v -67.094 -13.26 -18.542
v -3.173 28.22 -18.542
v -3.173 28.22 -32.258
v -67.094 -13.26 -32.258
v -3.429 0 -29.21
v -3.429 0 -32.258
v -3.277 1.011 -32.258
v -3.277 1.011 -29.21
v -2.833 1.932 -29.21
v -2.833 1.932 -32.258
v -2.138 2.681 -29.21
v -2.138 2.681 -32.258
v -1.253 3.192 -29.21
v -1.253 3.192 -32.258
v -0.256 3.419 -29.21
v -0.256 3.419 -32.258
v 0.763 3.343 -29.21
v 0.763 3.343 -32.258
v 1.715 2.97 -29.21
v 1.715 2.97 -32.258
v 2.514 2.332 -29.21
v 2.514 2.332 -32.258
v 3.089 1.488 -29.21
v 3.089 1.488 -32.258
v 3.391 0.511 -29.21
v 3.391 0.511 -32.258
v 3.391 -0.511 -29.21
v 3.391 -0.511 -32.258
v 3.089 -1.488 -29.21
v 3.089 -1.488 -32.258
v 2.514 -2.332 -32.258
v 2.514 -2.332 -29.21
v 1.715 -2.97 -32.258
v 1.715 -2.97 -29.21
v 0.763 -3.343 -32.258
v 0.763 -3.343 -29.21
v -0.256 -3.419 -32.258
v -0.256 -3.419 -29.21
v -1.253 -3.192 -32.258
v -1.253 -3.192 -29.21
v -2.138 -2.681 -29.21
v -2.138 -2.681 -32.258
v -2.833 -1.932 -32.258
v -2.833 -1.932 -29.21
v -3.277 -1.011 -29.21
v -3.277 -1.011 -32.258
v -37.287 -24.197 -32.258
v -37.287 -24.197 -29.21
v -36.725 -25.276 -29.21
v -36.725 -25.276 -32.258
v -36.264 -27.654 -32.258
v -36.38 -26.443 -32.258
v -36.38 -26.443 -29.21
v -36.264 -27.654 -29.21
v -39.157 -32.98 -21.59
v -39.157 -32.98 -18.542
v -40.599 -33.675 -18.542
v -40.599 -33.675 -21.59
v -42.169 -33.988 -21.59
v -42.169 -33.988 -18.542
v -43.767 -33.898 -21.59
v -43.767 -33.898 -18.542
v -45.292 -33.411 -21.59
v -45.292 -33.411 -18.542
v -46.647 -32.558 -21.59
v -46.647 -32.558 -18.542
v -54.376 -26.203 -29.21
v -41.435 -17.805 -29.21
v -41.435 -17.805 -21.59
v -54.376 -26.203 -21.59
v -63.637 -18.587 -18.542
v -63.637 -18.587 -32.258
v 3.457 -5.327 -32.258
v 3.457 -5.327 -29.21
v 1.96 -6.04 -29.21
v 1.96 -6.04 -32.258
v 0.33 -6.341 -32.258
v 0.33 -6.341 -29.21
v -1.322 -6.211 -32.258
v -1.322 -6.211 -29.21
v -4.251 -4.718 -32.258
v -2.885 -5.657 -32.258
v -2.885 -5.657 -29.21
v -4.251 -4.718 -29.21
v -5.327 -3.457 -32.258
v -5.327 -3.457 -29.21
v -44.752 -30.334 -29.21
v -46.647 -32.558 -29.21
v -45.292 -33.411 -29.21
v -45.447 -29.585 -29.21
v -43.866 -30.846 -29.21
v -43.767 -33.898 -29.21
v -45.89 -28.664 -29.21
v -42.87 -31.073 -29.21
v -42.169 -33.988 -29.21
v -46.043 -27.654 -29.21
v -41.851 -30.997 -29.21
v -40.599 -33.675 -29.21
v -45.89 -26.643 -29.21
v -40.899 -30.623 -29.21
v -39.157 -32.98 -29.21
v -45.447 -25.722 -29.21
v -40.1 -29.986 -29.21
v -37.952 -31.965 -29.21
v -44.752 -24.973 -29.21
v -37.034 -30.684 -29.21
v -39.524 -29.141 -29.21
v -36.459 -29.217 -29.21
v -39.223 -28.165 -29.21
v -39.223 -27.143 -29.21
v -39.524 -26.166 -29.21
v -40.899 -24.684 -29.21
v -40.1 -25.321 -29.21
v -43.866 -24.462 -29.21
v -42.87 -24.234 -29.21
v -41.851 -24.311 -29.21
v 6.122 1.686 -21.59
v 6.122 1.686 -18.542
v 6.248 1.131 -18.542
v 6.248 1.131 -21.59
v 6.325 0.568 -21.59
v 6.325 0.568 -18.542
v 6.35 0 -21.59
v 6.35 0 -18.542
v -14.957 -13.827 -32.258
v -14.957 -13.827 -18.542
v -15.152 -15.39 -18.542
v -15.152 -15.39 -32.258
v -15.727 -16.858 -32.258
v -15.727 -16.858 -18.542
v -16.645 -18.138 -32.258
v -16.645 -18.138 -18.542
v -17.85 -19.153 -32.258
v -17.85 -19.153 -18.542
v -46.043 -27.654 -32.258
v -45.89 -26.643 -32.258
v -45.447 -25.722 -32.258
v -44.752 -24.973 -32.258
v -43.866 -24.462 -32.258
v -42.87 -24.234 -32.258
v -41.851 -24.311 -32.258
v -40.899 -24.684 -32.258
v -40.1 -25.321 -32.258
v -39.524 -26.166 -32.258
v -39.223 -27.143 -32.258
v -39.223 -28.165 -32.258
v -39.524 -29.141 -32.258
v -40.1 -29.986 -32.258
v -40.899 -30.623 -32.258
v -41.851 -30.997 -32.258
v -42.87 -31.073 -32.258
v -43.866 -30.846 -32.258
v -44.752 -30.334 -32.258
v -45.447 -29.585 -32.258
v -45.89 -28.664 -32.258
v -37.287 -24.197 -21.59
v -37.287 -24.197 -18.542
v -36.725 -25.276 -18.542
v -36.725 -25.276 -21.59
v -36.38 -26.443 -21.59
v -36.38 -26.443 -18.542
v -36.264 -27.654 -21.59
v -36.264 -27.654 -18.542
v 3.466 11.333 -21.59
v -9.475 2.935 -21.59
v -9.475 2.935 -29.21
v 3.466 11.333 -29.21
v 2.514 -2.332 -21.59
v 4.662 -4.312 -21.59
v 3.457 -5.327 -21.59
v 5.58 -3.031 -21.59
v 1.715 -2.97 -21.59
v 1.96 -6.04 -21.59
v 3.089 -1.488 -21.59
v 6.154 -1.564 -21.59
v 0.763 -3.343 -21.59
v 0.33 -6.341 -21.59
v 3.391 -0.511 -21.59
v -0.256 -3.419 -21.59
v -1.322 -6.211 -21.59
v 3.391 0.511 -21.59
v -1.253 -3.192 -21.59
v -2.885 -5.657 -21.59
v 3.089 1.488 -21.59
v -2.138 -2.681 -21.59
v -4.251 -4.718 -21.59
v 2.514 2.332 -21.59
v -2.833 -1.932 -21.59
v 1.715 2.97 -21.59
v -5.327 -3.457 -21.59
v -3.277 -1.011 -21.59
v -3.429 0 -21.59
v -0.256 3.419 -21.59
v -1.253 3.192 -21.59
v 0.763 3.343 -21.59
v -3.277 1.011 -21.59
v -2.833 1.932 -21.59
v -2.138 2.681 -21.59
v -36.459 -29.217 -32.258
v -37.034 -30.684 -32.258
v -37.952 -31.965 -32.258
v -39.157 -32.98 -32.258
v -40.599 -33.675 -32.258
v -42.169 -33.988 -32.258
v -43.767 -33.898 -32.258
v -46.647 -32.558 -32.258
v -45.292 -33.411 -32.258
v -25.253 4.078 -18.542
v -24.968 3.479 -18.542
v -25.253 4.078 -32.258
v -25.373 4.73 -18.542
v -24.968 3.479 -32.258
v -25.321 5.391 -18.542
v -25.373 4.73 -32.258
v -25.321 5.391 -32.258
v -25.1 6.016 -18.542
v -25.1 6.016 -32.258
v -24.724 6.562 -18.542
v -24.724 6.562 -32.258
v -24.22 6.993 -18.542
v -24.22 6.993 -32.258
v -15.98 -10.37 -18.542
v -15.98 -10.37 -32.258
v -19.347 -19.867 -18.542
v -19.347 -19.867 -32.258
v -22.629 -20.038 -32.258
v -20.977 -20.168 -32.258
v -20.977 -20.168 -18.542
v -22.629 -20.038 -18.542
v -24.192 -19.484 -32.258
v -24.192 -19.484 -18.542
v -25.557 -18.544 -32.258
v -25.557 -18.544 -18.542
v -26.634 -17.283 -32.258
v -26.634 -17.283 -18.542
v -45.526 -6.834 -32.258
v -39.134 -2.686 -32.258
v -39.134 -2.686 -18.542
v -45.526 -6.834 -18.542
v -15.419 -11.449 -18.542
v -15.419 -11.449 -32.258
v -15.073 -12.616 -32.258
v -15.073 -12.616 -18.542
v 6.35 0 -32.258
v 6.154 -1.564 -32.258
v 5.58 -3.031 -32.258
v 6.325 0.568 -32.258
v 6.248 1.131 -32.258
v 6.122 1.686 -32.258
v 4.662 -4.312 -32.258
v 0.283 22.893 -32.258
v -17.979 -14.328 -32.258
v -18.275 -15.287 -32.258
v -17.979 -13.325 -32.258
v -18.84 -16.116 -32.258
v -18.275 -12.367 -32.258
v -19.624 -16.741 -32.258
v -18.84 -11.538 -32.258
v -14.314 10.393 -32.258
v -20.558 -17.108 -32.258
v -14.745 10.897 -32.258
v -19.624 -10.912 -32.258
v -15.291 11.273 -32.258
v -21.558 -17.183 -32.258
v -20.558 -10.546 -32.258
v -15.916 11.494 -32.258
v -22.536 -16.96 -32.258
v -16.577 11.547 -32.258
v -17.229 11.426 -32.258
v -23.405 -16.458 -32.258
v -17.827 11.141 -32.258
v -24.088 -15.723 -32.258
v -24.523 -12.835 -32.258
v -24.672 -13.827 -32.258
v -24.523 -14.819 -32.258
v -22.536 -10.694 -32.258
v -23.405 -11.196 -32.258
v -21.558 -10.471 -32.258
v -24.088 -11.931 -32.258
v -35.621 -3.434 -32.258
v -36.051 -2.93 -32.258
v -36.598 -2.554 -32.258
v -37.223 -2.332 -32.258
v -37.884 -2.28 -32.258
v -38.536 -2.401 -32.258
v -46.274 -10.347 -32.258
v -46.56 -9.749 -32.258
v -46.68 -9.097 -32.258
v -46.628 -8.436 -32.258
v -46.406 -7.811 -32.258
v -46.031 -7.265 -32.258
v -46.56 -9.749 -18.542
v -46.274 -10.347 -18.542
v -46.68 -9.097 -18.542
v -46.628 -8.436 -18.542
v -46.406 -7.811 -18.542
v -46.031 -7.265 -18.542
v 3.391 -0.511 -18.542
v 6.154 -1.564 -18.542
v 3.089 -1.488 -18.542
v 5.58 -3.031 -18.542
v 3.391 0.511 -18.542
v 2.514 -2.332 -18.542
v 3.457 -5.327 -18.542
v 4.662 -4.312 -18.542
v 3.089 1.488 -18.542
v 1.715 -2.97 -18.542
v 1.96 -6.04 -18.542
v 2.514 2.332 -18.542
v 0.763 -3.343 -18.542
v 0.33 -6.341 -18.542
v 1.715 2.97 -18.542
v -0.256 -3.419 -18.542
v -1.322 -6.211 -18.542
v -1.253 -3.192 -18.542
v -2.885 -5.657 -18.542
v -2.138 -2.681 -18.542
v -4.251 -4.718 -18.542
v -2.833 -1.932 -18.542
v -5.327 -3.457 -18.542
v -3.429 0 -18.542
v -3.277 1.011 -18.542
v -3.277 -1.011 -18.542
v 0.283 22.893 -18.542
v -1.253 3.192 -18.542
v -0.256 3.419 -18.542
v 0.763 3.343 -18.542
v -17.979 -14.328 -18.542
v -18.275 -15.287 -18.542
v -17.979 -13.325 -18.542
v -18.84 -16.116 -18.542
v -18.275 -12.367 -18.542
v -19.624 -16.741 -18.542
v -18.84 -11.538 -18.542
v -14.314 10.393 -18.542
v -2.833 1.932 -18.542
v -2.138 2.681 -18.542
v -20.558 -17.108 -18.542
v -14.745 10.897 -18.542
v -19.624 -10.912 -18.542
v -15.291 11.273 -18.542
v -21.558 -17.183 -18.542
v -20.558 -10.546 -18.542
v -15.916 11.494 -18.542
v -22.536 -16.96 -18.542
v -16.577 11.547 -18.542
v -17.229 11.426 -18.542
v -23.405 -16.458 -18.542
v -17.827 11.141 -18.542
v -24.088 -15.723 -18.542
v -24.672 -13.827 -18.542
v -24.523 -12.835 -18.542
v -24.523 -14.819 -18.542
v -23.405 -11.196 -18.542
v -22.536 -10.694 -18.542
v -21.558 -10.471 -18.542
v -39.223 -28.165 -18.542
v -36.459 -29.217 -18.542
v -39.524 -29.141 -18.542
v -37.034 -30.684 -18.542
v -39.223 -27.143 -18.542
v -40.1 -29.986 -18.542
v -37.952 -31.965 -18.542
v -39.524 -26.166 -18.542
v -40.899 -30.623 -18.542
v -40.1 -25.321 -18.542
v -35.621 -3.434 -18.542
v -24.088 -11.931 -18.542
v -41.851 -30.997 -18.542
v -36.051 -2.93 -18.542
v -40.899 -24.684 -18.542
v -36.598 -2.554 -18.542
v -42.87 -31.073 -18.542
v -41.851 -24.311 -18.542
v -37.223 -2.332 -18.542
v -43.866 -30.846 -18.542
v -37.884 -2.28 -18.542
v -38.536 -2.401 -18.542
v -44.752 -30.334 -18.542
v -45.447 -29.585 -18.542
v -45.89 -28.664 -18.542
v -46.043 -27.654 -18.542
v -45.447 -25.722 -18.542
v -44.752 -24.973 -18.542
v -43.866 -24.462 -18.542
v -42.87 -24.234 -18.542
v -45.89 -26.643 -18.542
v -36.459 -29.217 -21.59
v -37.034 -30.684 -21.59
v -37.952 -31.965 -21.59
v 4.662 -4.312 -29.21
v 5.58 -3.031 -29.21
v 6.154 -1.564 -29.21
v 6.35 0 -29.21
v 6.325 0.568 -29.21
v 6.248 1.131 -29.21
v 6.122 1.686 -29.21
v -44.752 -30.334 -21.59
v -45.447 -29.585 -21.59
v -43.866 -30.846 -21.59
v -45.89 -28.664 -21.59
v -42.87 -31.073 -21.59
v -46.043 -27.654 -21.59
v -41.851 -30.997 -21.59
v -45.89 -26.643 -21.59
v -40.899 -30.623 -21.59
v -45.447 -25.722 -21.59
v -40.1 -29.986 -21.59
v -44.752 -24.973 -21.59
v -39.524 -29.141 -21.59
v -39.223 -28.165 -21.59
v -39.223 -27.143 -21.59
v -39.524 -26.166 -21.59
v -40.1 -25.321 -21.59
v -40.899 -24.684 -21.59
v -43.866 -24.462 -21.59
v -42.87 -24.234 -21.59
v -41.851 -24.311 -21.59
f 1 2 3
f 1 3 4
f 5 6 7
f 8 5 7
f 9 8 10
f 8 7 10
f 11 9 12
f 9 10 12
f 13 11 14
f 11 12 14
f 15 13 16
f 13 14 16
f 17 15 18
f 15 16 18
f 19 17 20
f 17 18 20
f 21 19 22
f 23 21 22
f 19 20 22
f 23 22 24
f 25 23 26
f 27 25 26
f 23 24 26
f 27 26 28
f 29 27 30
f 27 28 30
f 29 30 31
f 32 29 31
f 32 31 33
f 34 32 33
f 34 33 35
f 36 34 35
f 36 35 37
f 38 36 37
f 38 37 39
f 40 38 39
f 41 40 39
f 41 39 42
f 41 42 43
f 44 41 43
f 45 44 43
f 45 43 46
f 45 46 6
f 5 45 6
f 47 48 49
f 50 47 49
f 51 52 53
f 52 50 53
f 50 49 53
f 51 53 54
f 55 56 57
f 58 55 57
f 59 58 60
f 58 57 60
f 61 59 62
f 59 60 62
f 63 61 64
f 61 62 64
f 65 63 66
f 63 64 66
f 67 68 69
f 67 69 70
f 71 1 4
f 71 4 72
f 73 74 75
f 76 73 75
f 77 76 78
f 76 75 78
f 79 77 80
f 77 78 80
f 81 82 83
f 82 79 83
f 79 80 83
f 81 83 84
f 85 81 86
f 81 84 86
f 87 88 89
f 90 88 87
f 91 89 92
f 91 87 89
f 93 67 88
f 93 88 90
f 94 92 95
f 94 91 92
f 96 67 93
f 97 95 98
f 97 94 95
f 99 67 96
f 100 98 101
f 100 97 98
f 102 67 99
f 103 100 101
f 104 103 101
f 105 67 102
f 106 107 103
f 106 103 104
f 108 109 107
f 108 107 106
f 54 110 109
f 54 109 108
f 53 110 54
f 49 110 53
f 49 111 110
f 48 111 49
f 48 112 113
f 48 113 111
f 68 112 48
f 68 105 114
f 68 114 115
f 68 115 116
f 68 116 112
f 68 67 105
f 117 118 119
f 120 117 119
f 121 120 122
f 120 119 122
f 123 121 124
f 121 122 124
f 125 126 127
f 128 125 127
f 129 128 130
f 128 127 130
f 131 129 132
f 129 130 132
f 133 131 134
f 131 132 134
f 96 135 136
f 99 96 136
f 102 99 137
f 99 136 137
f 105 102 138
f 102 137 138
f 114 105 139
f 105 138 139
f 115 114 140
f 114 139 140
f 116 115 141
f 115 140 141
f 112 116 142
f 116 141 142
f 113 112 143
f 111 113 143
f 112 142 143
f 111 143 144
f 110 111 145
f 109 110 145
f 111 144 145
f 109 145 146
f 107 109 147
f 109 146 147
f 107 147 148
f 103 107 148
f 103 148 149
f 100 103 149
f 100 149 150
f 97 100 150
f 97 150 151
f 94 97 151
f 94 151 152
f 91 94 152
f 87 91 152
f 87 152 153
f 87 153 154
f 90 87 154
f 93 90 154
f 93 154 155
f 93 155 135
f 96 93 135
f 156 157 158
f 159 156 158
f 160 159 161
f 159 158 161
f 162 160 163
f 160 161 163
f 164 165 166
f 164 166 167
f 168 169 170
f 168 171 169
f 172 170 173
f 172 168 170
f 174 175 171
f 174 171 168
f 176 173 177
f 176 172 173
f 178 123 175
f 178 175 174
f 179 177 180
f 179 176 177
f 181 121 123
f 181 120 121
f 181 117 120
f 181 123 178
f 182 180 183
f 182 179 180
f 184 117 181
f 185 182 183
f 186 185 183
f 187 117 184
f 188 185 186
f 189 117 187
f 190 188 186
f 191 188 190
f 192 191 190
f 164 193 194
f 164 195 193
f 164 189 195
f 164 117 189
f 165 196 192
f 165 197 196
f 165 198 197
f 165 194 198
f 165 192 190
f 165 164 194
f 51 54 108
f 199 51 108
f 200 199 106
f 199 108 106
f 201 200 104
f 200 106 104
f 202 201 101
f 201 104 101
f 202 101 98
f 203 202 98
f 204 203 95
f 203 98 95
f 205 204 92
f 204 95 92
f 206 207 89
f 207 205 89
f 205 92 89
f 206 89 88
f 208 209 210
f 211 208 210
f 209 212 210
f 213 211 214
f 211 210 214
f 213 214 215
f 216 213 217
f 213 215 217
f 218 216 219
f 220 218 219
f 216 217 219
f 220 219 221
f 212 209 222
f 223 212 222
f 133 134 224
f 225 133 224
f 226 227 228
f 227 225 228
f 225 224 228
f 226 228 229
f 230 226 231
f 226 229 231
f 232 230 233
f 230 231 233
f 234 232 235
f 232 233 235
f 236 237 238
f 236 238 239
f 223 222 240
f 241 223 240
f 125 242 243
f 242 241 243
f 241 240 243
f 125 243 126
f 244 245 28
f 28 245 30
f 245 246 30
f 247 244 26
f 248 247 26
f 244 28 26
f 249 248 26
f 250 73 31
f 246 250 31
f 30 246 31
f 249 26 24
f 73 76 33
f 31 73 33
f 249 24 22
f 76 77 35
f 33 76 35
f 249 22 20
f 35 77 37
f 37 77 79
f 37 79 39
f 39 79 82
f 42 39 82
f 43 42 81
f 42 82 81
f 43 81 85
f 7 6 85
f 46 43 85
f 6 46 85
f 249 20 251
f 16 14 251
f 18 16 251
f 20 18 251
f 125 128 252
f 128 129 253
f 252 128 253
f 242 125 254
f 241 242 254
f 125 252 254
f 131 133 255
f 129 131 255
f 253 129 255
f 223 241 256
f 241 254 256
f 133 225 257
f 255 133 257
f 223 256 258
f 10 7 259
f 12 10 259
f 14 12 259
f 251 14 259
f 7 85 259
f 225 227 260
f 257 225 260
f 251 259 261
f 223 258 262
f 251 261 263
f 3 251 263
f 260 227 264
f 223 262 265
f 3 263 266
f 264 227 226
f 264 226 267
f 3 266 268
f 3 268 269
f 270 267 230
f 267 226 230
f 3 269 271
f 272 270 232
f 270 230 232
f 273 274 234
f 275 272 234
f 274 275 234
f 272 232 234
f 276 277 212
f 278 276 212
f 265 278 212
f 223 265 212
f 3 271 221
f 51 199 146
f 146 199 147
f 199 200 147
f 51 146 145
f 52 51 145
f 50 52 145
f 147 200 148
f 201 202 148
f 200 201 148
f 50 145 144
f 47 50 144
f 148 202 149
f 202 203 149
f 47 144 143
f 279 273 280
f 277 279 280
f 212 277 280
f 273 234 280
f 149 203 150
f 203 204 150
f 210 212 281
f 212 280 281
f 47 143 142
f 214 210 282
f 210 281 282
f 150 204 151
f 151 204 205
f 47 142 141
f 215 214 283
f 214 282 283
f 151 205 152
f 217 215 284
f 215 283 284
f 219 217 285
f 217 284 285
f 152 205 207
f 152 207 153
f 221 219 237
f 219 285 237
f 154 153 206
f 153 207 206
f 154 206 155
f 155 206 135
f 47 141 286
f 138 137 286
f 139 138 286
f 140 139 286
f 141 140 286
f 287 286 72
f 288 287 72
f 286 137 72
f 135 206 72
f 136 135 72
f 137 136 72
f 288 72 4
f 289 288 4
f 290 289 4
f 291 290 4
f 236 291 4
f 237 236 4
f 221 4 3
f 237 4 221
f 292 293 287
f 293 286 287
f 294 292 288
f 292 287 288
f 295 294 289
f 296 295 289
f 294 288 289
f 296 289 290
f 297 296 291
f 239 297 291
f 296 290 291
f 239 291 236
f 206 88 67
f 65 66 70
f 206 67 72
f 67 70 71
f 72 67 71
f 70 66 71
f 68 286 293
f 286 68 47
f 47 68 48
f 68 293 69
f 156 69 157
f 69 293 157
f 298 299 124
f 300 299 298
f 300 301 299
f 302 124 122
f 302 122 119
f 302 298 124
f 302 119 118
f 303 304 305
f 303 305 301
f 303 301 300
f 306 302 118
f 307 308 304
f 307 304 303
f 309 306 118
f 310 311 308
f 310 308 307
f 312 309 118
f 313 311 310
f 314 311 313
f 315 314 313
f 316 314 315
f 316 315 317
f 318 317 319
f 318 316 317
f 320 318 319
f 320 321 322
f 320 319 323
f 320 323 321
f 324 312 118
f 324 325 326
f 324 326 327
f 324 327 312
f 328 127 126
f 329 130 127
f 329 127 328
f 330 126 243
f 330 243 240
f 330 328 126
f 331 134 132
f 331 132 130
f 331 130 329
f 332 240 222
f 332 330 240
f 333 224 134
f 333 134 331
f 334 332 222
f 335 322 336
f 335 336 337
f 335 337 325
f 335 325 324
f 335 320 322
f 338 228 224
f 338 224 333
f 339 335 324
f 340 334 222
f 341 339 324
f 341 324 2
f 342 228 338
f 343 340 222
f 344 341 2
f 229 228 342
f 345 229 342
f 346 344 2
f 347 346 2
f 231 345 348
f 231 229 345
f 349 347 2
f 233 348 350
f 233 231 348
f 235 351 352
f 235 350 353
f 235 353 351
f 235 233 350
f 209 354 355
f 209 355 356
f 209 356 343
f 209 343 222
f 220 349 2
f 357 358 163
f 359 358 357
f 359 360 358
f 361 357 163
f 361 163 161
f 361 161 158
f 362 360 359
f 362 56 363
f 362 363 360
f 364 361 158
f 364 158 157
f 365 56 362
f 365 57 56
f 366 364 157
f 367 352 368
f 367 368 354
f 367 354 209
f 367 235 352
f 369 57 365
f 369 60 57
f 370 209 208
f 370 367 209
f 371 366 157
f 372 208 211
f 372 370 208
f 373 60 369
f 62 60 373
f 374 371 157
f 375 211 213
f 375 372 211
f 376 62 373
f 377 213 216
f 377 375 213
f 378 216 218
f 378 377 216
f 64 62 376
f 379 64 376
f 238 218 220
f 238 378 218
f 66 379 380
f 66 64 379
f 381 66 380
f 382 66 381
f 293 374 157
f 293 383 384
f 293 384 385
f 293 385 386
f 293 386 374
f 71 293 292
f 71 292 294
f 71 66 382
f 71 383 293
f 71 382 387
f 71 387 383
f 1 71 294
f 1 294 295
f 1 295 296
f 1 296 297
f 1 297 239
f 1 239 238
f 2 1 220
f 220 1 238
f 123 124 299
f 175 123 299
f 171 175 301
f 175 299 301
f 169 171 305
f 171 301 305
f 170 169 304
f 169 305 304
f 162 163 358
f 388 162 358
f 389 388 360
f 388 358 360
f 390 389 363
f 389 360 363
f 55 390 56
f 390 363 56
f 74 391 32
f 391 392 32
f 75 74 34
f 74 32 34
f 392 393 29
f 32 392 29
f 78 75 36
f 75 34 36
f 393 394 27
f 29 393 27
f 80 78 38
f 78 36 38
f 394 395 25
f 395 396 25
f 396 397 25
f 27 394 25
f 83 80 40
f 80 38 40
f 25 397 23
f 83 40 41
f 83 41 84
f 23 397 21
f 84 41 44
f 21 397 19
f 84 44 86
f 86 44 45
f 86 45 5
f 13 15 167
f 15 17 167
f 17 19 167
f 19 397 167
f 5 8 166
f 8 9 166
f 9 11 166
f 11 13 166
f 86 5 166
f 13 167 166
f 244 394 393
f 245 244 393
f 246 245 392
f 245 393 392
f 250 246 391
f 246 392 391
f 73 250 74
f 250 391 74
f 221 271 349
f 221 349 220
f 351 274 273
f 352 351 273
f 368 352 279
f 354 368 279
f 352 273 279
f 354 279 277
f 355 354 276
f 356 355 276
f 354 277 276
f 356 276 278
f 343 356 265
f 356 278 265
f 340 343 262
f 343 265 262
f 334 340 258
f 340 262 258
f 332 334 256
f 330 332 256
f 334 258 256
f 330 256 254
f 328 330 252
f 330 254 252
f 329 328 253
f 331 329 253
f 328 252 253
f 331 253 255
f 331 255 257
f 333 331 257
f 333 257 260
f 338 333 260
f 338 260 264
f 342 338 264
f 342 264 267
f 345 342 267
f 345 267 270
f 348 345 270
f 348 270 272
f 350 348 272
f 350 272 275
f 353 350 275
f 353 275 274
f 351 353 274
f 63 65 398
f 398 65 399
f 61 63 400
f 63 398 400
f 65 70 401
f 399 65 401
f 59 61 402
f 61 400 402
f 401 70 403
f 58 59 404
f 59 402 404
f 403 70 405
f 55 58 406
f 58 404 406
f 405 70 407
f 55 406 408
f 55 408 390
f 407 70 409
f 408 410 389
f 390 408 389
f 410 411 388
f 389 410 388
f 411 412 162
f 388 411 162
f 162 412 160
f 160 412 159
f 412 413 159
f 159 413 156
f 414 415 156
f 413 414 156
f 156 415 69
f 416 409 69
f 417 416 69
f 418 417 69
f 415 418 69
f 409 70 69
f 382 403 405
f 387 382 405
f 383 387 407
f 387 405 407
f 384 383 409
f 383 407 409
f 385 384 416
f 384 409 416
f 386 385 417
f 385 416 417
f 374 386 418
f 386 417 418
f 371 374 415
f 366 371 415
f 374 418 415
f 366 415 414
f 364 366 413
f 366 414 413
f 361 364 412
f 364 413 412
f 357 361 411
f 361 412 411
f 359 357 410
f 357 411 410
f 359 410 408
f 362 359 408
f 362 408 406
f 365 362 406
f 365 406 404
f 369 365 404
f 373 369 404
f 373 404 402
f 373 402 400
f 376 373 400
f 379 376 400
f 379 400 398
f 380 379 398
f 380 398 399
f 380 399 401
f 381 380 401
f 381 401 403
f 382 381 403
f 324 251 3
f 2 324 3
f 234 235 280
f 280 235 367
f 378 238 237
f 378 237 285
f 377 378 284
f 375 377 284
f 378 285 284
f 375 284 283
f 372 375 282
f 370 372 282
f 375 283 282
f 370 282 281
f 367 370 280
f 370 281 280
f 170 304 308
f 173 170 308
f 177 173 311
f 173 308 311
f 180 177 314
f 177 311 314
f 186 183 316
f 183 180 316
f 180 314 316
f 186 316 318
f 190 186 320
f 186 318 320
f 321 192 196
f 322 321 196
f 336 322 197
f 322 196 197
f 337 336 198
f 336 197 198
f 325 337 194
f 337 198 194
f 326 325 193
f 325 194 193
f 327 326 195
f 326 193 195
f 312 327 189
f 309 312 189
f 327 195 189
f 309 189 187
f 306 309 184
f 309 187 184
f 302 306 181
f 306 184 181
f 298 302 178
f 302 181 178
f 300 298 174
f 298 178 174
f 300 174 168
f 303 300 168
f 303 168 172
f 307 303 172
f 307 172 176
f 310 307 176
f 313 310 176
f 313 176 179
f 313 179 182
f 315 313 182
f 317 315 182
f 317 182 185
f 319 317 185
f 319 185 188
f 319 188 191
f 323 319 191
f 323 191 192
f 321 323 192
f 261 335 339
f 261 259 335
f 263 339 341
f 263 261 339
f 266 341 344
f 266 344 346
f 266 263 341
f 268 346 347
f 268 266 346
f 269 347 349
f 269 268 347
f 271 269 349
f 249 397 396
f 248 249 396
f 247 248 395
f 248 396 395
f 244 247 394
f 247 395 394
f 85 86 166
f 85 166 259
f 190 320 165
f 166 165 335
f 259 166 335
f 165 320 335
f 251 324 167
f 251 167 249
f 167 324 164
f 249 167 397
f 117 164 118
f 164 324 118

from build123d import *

# Parameters (mm, degrees)
SKETCH1_R               = 3.175
SKETCH1_R_2             = 3.1115
BOSS_EXTRUDE1_DEPTH     = 50.8
CUT_EXTRUDE1_DEPTH      = 3.81
CUT_EXTRUDE6_DEPTH      = 94.132822302
CUT_EXTRUDE7_DEPTH      = 81.280992342
CUT_EXTRUDE7_DEPTH_BACK = 81.280992342
SKETCH8_W               = 18.542
SKETCH8_H               = 31.75
SKETCH9_R               = 3.429
SKETCH9_R_2             = 3.3655
CUT_EXTRUDE8_DEPTH      = 77.458810064
FILLET1_R               = 2.54


with BuildPart() as part:
    # Sketch1 → Boss-Extrude1 (new body)
    with BuildSketch(Plane.XY):
        Polygon((-3.17337999, 28.220199493), (-67.093802786, -13.260151874), (-49.810323049, -39.893661373), (14.110099747, 1.586689995), align=None)
        Circle(SKETCH1_R, mode=Mode.SUBTRACT)
        with Locations((-42.613615197, -27.653567579)):
            Circle(SKETCH1_R, mode=Mode.SUBTRACT)
        with Locations((-21.306807599, -13.826783789)):
            Circle(SKETCH1_R_2, mode=Mode.SUBTRACT)
    extrude(amount=-BOSS_EXTRUDE1_DEPTH)

    # Sketch2 → Cut-Extrude1 (cut, symmetric)
    with BuildSketch(Plane.XY.offset(-25.4)):
        Polygon((-36.108246535, -14.348133404), (-57.415054133, -28.174917194), (-49.810323049, -39.893661373), (-39.15691925, -32.980269478), (-28.503515451, -26.066877584), align=None)
        Polygon((-14.801438936, -0.521349615), (6.505368663, 13.305434174), (14.110099747, 1.586689995), (3.456695947, -5.3267019), (-7.196707852, -12.240093794), align=None)
    extrude(amount=CUT_EXTRUDE1_DEPTH, both=True, mode=Mode.SUBTRACT)

    # Sketch7 → Cut-Extrude6 (cut, through all)
    with BuildSketch(Plane.XY):
        with BuildLine():
            Line((-47.65700114, -8.216765932), (-37.286913298, -24.196871631))
            ThreePointArc((-37.286913298, -24.196871631), (-36.524811659, -25.851077227), (-36.263615197, -27.653567579))
            ThreePointArc((-36.263615197, -27.653567579), (-37.033627746, -30.684448646), (-39.156919149, -32.980269413))
            Line((-39.156919149, -32.980269413), (-17.850111759, -19.153485759))
            ThreePointArc((-17.850111759, -19.153485759), (-22.629101551, -20.037583955), (-26.633509498, -17.283479737))
            Line((-26.633509498, -17.283479737), (-37.00359734, -1.303374038))
            Line((-37.00359734, -1.303374038), (-47.65700114, -8.216765932))
        make_face()
        with BuildLine():
            ThreePointArc((-14.956807599, -13.826783789), (-15.726820207, -16.857664966), (-17.850111759, -19.153485759))
            Line((-17.850111759, -19.153485759), (3.456695863, -5.326701954))
            ThreePointArc((3.456695863, -5.326701954), (-1.322293939, -6.210800169), (-5.3267019, -3.456695947))
            Line((-5.3267019, -3.456695947), (-15.696789742, 12.523409752))
            Line((-15.696789742, 12.523409752), (-26.350193541, 5.610017857))
            Line((-26.350193541, 5.610017857), (-15.980105699, -10.370087842))
            ThreePointArc((-15.980105699, -10.370087842), (-15.21800406, -12.024293437), (-14.956807599, -13.826783789))
        make_face()
        with BuildLine():
            ThreePointArc((6.35, 0), (5.579987398, -3.030881165), (3.456695863, -5.326701954))
            Line((3.456695863, -5.326701954), (14.110099747, 1.586689995))
            Line((14.110099747, 1.586689995), (0.283315957, 22.893497594))
            Line((0.283315957, 22.893497594), (6.122209073, 1.685543256))
            ThreePointArc((6.122209073, 1.685543256), (6.292794594, 0.850432945), (6.35, 0))
        make_face()
        with BuildLine():
            ThreePointArc((-39.156919149, -32.980269413), (-42.970845505, -33.993511309), (-46.646808241, -32.558244313))
            Line((-46.646808241, -32.558244313), (-63.637106839, -18.586853774))
            Line((-63.637106839, -18.586853774), (-49.810323049, -39.893661373))
            Line((-49.810323049, -39.893661373), (-39.156919149, -32.980269413))
        make_face()
    extrude(amount=-CUT_EXTRUDE6_DEPTH, mode=Mode.SUBTRACT)

    # Sketch8 → Cut-Extrude7 (cut, two sides: drawn at the far end of the back side and taken through both)
    with BuildSketch(Plane(origin=(-21.306807599, -13.826783789, 0), x_dir=(0, 0, -1), z_dir=(0.838850692859666, 0.5443615665059929, 0)).offset(-CUT_EXTRUDE7_DEPTH_BACK)):
        with Locations((9.271, 9.525)):
            Rectangle(SKETCH8_W, SKETCH8_H)
        with Locations((41.529, 9.525)):
            Rectangle(SKETCH8_W, SKETCH8_H)
    extrude(amount=CUT_EXTRUDE7_DEPTH + CUT_EXTRUDE7_DEPTH_BACK, mode=Mode.SUBTRACT)

    # Sketch9 → Cut-Extrude8 (cut, through all)
    with BuildSketch(Plane(origin=(0, 0, -32.258), x_dir=(-1, 0, 0), z_dir=(0, 0, -1))):
        Circle(SKETCH9_R)
        with Locations((21.306807599, -13.826783789)):
            Circle(SKETCH9_R_2)
        with Locations((42.613615197, -27.653567579)):
            Circle(SKETCH9_R)
    extrude(amount=-CUT_EXTRUDE8_DEPTH, mode=Mode.SUBTRACT)

    # Fillet1
    fillet1_edges = [part.edges().sort_by_distance(p)[0] for p in [
        (-15.696789742, 12.523409752, -25.4),
        (-26.350193541, 5.610017857, -25.4),
        (-37.00359734, -1.303374038, -25.4),
        (-47.65700114, -8.216765932, -25.4),
    ]]
    fillet(fillet1_edges, radius=FILLET1_R)


solid = part.part
